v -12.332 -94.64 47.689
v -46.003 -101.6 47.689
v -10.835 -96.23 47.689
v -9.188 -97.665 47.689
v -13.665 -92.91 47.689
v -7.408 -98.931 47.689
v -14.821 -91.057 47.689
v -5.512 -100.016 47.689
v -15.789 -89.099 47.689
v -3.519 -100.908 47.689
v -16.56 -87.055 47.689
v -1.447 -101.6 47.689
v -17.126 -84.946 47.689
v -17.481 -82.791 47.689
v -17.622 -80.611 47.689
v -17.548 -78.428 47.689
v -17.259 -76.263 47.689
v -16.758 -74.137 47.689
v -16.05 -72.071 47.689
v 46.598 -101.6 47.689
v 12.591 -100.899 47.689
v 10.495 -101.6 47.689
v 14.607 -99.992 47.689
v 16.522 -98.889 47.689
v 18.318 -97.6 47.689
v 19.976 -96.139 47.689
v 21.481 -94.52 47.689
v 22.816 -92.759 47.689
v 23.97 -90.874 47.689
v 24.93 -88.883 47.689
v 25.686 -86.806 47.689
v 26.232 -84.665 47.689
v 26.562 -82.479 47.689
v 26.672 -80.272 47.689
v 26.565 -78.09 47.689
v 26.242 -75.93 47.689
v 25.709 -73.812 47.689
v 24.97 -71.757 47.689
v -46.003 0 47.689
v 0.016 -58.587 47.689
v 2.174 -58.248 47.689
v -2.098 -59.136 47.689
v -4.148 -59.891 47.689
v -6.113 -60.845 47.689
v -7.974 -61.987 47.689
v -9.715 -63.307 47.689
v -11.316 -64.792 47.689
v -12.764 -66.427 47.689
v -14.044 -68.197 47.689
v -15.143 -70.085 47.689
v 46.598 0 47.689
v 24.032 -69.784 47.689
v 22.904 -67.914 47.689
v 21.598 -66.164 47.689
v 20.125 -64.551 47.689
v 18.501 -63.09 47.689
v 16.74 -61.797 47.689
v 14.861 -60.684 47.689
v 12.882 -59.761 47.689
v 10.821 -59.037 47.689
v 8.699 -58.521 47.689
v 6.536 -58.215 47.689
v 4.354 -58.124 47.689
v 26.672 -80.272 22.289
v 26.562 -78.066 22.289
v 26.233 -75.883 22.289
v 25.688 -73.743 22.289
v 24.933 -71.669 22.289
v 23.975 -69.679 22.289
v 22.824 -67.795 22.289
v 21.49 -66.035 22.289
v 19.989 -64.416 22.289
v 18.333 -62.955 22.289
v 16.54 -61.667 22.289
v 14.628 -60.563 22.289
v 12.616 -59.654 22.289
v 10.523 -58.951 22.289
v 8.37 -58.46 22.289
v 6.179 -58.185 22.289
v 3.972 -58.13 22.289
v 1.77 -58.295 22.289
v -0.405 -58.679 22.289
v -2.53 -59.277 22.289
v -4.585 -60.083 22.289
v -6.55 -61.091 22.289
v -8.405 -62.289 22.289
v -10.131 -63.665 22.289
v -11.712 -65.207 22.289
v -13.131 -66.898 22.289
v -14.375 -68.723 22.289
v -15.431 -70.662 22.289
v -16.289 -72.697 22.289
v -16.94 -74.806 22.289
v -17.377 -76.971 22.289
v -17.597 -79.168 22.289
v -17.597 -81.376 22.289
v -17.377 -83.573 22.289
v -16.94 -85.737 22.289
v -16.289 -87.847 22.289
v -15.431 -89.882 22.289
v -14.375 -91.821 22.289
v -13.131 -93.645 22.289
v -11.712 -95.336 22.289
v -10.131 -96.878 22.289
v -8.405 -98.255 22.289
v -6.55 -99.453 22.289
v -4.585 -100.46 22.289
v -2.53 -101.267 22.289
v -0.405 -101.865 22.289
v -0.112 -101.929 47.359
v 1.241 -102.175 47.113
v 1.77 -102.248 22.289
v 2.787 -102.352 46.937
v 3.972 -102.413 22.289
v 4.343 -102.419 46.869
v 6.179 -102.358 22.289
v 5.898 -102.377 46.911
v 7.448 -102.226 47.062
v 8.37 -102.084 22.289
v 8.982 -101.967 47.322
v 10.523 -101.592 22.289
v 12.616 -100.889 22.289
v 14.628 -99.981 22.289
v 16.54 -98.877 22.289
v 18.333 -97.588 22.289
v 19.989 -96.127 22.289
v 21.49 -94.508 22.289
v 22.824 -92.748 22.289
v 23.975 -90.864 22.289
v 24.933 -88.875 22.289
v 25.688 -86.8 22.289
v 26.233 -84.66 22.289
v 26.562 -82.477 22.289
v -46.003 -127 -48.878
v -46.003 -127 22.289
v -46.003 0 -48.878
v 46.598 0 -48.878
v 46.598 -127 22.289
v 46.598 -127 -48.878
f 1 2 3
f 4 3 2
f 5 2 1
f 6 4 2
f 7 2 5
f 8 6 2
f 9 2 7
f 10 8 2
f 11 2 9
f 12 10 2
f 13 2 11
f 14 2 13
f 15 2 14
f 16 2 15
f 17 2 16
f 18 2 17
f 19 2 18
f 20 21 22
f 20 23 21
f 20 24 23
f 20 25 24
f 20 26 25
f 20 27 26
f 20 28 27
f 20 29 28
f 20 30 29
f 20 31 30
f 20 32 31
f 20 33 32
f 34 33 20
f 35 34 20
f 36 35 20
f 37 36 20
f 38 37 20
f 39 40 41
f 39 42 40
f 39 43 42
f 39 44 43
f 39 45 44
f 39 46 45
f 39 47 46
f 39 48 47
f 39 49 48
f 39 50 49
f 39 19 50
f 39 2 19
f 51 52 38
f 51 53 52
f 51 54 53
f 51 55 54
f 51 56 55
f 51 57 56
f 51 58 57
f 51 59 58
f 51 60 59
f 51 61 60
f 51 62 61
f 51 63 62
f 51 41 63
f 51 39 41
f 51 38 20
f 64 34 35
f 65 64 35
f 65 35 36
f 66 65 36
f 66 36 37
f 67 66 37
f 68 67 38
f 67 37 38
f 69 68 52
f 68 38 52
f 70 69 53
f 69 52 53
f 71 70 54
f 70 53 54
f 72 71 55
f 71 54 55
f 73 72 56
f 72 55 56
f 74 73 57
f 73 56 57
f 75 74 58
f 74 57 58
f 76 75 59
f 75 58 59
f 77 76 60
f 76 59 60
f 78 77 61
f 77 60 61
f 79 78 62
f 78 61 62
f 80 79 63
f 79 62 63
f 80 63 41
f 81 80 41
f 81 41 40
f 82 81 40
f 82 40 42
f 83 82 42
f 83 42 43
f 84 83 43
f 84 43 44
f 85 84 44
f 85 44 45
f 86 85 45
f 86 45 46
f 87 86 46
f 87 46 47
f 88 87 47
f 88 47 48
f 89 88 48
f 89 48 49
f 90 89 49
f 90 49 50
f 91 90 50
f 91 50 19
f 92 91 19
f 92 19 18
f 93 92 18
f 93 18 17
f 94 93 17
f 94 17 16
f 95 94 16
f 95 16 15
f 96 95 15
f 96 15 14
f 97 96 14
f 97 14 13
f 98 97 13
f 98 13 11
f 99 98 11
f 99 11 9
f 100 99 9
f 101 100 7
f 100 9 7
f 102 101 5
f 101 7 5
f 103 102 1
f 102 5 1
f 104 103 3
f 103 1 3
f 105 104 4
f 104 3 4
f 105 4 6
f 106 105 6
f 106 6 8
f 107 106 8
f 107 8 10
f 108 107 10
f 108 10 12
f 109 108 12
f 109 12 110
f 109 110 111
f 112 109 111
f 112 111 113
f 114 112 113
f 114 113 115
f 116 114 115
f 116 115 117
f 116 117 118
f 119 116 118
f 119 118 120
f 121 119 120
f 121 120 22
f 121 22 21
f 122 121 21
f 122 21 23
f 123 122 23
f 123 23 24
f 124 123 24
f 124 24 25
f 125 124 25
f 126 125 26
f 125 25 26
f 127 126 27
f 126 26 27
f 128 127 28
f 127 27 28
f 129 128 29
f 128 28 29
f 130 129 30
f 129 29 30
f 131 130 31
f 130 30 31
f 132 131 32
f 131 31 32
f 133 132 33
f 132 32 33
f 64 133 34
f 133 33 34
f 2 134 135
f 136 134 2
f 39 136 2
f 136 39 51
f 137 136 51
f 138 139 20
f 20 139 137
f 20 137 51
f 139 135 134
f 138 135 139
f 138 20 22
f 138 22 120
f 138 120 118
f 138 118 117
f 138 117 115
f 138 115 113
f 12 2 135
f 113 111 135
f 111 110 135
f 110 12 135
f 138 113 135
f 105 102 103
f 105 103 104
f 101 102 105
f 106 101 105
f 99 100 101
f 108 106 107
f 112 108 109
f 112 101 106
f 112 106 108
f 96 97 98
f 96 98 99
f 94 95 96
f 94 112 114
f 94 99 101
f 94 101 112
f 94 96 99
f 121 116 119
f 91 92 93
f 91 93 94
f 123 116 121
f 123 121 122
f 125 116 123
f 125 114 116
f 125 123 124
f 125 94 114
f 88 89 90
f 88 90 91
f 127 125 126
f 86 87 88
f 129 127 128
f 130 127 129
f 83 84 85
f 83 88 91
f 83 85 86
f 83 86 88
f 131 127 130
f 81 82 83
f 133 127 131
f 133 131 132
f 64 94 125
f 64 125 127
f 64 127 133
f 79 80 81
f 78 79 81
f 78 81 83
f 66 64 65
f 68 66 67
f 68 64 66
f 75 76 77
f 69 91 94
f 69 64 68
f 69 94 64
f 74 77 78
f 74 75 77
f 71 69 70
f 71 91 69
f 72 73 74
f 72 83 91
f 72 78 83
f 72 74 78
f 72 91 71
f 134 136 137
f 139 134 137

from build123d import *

# Parameters (mm, degrees)
F0_W        = 92.6014147699
F0_H        = 96.5672135353
F1_DEPTH    = 127
F2_R        = 22.1483335528
F3_DEPTH    = 25.4
F4_T1_DEPTH = 223.2429105586


# Not quite as in the source:
# - a fillet or chamfer that OpenCascade refuses, or shapes differently, is made with other operations: its cross-section is extruded or revolved along the edge and cut away or added


with BuildPart() as f1:
    # F0 (on Front) → F1 (new body)
    with BuildSketch(Plane.XZ):
        with Locations((0.2974327654, -0.594869256)):
            Rectangle(F0_W, F0_H)
    extrude(amount=F1_DEPTH)

    # F2 (on face) → F3 (cut)
    with BuildSketch(Plane.XY.offset(47.6887375116)):
        with Locations((4.5238654129, -80.271743238)):
            Circle(F2_R)
    extrude(amount=-F3_DEPTH, mode=Mode.SUBTRACT)

    # F4: chamfer of 25.4 on 1 edges, made by hand

    # F4_s2 → F4_t1 (cut)
    with BuildSketch(Plane.YZ.offset(-111.3240225139)):
        Polygon((-101.6, 47.6887375116), (-127, 22.2887375116), (-127, 47.6887375116), align=None)
    extrude(amount=F4_T1_DEPTH, mode=Mode.SUBTRACT)


solid = f1.part
